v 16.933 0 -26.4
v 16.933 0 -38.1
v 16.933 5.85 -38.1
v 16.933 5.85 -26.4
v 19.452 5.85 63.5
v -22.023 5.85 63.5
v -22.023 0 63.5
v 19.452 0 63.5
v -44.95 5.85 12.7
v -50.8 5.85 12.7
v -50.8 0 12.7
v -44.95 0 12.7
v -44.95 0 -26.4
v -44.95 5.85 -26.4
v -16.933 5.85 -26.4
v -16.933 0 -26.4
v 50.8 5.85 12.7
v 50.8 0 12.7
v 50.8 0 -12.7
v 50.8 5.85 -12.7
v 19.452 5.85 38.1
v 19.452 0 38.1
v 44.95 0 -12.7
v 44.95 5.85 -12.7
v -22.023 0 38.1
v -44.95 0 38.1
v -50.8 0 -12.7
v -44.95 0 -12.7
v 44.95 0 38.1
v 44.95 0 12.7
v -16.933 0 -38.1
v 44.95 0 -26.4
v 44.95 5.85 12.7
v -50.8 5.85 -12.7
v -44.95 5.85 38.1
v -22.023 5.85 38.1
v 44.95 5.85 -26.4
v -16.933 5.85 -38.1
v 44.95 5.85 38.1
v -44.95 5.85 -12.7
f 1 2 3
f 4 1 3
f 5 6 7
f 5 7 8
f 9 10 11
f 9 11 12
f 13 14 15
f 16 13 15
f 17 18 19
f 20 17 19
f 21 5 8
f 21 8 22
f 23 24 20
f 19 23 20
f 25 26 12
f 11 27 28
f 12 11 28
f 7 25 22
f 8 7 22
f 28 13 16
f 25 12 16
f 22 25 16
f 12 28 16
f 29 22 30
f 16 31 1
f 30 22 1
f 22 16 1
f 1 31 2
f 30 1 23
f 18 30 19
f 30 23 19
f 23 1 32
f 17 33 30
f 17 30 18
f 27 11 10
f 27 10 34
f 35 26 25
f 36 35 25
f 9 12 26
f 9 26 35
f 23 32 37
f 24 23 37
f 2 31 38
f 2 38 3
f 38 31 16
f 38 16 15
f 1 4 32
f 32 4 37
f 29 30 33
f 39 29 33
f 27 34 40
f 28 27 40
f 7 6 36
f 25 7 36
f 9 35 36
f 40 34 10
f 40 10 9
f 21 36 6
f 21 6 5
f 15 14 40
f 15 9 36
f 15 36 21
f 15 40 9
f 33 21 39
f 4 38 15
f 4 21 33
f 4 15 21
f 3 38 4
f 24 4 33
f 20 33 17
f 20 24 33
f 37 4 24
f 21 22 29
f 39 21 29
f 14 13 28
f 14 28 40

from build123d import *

# Parameters (mm, degrees)
SKETCH1_W           = 101.6
SKETCH1_H           = 76.2
BOSS_EXTRUDE1_DEPTH = 5.85
SKETCH2_W           = 41.475447085
SKETCH2_H           = 25.4
BOSS_EXTRUDE2_DEPTH = 5.85
CAVITY1_START       = -38.1
CAVITY1_OUTLINE_W   = 33.866666667
CAVITY1_OUTLINE_H   = 5.85
CAVITY1_DEPTH       = 11.7
CAVITY1_START_2     = 12.7
CAVITY1_2_OUTLINE_W = 5.85
CAVITY1_2_OUTLINE_H = 5.85
CAVITY1_2_DEPTH     = 25.4
CAVITY1_START_3     = -26.4
CAVITY1_3_OUTLINE_W = 5.85
CAVITY1_3_OUTLINE_H = 5.85
CAVITY1_3_DEPTH     = 13.7


# Read off the part's stored shape, not the designer's step: Cavity1
with BuildPart() as part:
    # Sketch1 → Boss-Extrude1 (new body)
    with BuildSketch(Plane(origin=(0, 0, 0), x_dir=(1, 0, 0), z_dir=(0, 1, 0))):
        Rectangle(SKETCH1_W, SKETCH1_H)
    extrude(amount=BOSS_EXTRUDE1_DEPTH)

    # Sketch2 → Boss-Extrude2 (add)
    with BuildSketch(Plane(origin=(0, 5.85, 0), x_dir=(1, 0, 0), z_dir=(0, 1, 0))):
        with Locations((-1.285396087, -50.8)):
            Rectangle(SKETCH2_W, SKETCH2_H)
    extrude(amount=-BOSS_EXTRUDE2_DEPTH)

    # Cavity1 outline → Cavity1 (cut)
    with BuildSketch(Plane.XY.offset(CAVITY1_START)):
        with Locations((33.866666667, 2.925)):
            Rectangle(CAVITY1_OUTLINE_W, CAVITY1_OUTLINE_H)
        with Locations((-33.866666667, 2.925)):
            Rectangle(CAVITY1_OUTLINE_W, CAVITY1_OUTLINE_H)
    extrude(amount=CAVITY1_DEPTH, mode=Mode.SUBTRACT)

    # Cavity1 2 outline → Cavity1 2 (cut)
    with BuildSketch(Plane.XY.offset(CAVITY1_START_2)):
        with Locations((47.875, 2.925)):
            Rectangle(CAVITY1_2_OUTLINE_W, CAVITY1_2_OUTLINE_H)
        with Locations((-47.875, 2.925)):
            Rectangle(CAVITY1_2_OUTLINE_W, CAVITY1_2_OUTLINE_H)
    extrude(amount=CAVITY1_2_DEPTH, mode=Mode.SUBTRACT)

    # Cavity1 3 outline → Cavity1 3 (cut)
    with BuildSketch(Plane.XY.offset(CAVITY1_START_3)):
        with Locations((47.875, 2.925)):
            Rectangle(CAVITY1_3_OUTLINE_W, CAVITY1_3_OUTLINE_H)
        with Locations((-47.875, 2.925)):
            Rectangle(CAVITY1_3_OUTLINE_W, CAVITY1_3_OUTLINE_H)
    extrude(amount=CAVITY1_3_DEPTH, mode=Mode.SUBTRACT)


solid = part.part
